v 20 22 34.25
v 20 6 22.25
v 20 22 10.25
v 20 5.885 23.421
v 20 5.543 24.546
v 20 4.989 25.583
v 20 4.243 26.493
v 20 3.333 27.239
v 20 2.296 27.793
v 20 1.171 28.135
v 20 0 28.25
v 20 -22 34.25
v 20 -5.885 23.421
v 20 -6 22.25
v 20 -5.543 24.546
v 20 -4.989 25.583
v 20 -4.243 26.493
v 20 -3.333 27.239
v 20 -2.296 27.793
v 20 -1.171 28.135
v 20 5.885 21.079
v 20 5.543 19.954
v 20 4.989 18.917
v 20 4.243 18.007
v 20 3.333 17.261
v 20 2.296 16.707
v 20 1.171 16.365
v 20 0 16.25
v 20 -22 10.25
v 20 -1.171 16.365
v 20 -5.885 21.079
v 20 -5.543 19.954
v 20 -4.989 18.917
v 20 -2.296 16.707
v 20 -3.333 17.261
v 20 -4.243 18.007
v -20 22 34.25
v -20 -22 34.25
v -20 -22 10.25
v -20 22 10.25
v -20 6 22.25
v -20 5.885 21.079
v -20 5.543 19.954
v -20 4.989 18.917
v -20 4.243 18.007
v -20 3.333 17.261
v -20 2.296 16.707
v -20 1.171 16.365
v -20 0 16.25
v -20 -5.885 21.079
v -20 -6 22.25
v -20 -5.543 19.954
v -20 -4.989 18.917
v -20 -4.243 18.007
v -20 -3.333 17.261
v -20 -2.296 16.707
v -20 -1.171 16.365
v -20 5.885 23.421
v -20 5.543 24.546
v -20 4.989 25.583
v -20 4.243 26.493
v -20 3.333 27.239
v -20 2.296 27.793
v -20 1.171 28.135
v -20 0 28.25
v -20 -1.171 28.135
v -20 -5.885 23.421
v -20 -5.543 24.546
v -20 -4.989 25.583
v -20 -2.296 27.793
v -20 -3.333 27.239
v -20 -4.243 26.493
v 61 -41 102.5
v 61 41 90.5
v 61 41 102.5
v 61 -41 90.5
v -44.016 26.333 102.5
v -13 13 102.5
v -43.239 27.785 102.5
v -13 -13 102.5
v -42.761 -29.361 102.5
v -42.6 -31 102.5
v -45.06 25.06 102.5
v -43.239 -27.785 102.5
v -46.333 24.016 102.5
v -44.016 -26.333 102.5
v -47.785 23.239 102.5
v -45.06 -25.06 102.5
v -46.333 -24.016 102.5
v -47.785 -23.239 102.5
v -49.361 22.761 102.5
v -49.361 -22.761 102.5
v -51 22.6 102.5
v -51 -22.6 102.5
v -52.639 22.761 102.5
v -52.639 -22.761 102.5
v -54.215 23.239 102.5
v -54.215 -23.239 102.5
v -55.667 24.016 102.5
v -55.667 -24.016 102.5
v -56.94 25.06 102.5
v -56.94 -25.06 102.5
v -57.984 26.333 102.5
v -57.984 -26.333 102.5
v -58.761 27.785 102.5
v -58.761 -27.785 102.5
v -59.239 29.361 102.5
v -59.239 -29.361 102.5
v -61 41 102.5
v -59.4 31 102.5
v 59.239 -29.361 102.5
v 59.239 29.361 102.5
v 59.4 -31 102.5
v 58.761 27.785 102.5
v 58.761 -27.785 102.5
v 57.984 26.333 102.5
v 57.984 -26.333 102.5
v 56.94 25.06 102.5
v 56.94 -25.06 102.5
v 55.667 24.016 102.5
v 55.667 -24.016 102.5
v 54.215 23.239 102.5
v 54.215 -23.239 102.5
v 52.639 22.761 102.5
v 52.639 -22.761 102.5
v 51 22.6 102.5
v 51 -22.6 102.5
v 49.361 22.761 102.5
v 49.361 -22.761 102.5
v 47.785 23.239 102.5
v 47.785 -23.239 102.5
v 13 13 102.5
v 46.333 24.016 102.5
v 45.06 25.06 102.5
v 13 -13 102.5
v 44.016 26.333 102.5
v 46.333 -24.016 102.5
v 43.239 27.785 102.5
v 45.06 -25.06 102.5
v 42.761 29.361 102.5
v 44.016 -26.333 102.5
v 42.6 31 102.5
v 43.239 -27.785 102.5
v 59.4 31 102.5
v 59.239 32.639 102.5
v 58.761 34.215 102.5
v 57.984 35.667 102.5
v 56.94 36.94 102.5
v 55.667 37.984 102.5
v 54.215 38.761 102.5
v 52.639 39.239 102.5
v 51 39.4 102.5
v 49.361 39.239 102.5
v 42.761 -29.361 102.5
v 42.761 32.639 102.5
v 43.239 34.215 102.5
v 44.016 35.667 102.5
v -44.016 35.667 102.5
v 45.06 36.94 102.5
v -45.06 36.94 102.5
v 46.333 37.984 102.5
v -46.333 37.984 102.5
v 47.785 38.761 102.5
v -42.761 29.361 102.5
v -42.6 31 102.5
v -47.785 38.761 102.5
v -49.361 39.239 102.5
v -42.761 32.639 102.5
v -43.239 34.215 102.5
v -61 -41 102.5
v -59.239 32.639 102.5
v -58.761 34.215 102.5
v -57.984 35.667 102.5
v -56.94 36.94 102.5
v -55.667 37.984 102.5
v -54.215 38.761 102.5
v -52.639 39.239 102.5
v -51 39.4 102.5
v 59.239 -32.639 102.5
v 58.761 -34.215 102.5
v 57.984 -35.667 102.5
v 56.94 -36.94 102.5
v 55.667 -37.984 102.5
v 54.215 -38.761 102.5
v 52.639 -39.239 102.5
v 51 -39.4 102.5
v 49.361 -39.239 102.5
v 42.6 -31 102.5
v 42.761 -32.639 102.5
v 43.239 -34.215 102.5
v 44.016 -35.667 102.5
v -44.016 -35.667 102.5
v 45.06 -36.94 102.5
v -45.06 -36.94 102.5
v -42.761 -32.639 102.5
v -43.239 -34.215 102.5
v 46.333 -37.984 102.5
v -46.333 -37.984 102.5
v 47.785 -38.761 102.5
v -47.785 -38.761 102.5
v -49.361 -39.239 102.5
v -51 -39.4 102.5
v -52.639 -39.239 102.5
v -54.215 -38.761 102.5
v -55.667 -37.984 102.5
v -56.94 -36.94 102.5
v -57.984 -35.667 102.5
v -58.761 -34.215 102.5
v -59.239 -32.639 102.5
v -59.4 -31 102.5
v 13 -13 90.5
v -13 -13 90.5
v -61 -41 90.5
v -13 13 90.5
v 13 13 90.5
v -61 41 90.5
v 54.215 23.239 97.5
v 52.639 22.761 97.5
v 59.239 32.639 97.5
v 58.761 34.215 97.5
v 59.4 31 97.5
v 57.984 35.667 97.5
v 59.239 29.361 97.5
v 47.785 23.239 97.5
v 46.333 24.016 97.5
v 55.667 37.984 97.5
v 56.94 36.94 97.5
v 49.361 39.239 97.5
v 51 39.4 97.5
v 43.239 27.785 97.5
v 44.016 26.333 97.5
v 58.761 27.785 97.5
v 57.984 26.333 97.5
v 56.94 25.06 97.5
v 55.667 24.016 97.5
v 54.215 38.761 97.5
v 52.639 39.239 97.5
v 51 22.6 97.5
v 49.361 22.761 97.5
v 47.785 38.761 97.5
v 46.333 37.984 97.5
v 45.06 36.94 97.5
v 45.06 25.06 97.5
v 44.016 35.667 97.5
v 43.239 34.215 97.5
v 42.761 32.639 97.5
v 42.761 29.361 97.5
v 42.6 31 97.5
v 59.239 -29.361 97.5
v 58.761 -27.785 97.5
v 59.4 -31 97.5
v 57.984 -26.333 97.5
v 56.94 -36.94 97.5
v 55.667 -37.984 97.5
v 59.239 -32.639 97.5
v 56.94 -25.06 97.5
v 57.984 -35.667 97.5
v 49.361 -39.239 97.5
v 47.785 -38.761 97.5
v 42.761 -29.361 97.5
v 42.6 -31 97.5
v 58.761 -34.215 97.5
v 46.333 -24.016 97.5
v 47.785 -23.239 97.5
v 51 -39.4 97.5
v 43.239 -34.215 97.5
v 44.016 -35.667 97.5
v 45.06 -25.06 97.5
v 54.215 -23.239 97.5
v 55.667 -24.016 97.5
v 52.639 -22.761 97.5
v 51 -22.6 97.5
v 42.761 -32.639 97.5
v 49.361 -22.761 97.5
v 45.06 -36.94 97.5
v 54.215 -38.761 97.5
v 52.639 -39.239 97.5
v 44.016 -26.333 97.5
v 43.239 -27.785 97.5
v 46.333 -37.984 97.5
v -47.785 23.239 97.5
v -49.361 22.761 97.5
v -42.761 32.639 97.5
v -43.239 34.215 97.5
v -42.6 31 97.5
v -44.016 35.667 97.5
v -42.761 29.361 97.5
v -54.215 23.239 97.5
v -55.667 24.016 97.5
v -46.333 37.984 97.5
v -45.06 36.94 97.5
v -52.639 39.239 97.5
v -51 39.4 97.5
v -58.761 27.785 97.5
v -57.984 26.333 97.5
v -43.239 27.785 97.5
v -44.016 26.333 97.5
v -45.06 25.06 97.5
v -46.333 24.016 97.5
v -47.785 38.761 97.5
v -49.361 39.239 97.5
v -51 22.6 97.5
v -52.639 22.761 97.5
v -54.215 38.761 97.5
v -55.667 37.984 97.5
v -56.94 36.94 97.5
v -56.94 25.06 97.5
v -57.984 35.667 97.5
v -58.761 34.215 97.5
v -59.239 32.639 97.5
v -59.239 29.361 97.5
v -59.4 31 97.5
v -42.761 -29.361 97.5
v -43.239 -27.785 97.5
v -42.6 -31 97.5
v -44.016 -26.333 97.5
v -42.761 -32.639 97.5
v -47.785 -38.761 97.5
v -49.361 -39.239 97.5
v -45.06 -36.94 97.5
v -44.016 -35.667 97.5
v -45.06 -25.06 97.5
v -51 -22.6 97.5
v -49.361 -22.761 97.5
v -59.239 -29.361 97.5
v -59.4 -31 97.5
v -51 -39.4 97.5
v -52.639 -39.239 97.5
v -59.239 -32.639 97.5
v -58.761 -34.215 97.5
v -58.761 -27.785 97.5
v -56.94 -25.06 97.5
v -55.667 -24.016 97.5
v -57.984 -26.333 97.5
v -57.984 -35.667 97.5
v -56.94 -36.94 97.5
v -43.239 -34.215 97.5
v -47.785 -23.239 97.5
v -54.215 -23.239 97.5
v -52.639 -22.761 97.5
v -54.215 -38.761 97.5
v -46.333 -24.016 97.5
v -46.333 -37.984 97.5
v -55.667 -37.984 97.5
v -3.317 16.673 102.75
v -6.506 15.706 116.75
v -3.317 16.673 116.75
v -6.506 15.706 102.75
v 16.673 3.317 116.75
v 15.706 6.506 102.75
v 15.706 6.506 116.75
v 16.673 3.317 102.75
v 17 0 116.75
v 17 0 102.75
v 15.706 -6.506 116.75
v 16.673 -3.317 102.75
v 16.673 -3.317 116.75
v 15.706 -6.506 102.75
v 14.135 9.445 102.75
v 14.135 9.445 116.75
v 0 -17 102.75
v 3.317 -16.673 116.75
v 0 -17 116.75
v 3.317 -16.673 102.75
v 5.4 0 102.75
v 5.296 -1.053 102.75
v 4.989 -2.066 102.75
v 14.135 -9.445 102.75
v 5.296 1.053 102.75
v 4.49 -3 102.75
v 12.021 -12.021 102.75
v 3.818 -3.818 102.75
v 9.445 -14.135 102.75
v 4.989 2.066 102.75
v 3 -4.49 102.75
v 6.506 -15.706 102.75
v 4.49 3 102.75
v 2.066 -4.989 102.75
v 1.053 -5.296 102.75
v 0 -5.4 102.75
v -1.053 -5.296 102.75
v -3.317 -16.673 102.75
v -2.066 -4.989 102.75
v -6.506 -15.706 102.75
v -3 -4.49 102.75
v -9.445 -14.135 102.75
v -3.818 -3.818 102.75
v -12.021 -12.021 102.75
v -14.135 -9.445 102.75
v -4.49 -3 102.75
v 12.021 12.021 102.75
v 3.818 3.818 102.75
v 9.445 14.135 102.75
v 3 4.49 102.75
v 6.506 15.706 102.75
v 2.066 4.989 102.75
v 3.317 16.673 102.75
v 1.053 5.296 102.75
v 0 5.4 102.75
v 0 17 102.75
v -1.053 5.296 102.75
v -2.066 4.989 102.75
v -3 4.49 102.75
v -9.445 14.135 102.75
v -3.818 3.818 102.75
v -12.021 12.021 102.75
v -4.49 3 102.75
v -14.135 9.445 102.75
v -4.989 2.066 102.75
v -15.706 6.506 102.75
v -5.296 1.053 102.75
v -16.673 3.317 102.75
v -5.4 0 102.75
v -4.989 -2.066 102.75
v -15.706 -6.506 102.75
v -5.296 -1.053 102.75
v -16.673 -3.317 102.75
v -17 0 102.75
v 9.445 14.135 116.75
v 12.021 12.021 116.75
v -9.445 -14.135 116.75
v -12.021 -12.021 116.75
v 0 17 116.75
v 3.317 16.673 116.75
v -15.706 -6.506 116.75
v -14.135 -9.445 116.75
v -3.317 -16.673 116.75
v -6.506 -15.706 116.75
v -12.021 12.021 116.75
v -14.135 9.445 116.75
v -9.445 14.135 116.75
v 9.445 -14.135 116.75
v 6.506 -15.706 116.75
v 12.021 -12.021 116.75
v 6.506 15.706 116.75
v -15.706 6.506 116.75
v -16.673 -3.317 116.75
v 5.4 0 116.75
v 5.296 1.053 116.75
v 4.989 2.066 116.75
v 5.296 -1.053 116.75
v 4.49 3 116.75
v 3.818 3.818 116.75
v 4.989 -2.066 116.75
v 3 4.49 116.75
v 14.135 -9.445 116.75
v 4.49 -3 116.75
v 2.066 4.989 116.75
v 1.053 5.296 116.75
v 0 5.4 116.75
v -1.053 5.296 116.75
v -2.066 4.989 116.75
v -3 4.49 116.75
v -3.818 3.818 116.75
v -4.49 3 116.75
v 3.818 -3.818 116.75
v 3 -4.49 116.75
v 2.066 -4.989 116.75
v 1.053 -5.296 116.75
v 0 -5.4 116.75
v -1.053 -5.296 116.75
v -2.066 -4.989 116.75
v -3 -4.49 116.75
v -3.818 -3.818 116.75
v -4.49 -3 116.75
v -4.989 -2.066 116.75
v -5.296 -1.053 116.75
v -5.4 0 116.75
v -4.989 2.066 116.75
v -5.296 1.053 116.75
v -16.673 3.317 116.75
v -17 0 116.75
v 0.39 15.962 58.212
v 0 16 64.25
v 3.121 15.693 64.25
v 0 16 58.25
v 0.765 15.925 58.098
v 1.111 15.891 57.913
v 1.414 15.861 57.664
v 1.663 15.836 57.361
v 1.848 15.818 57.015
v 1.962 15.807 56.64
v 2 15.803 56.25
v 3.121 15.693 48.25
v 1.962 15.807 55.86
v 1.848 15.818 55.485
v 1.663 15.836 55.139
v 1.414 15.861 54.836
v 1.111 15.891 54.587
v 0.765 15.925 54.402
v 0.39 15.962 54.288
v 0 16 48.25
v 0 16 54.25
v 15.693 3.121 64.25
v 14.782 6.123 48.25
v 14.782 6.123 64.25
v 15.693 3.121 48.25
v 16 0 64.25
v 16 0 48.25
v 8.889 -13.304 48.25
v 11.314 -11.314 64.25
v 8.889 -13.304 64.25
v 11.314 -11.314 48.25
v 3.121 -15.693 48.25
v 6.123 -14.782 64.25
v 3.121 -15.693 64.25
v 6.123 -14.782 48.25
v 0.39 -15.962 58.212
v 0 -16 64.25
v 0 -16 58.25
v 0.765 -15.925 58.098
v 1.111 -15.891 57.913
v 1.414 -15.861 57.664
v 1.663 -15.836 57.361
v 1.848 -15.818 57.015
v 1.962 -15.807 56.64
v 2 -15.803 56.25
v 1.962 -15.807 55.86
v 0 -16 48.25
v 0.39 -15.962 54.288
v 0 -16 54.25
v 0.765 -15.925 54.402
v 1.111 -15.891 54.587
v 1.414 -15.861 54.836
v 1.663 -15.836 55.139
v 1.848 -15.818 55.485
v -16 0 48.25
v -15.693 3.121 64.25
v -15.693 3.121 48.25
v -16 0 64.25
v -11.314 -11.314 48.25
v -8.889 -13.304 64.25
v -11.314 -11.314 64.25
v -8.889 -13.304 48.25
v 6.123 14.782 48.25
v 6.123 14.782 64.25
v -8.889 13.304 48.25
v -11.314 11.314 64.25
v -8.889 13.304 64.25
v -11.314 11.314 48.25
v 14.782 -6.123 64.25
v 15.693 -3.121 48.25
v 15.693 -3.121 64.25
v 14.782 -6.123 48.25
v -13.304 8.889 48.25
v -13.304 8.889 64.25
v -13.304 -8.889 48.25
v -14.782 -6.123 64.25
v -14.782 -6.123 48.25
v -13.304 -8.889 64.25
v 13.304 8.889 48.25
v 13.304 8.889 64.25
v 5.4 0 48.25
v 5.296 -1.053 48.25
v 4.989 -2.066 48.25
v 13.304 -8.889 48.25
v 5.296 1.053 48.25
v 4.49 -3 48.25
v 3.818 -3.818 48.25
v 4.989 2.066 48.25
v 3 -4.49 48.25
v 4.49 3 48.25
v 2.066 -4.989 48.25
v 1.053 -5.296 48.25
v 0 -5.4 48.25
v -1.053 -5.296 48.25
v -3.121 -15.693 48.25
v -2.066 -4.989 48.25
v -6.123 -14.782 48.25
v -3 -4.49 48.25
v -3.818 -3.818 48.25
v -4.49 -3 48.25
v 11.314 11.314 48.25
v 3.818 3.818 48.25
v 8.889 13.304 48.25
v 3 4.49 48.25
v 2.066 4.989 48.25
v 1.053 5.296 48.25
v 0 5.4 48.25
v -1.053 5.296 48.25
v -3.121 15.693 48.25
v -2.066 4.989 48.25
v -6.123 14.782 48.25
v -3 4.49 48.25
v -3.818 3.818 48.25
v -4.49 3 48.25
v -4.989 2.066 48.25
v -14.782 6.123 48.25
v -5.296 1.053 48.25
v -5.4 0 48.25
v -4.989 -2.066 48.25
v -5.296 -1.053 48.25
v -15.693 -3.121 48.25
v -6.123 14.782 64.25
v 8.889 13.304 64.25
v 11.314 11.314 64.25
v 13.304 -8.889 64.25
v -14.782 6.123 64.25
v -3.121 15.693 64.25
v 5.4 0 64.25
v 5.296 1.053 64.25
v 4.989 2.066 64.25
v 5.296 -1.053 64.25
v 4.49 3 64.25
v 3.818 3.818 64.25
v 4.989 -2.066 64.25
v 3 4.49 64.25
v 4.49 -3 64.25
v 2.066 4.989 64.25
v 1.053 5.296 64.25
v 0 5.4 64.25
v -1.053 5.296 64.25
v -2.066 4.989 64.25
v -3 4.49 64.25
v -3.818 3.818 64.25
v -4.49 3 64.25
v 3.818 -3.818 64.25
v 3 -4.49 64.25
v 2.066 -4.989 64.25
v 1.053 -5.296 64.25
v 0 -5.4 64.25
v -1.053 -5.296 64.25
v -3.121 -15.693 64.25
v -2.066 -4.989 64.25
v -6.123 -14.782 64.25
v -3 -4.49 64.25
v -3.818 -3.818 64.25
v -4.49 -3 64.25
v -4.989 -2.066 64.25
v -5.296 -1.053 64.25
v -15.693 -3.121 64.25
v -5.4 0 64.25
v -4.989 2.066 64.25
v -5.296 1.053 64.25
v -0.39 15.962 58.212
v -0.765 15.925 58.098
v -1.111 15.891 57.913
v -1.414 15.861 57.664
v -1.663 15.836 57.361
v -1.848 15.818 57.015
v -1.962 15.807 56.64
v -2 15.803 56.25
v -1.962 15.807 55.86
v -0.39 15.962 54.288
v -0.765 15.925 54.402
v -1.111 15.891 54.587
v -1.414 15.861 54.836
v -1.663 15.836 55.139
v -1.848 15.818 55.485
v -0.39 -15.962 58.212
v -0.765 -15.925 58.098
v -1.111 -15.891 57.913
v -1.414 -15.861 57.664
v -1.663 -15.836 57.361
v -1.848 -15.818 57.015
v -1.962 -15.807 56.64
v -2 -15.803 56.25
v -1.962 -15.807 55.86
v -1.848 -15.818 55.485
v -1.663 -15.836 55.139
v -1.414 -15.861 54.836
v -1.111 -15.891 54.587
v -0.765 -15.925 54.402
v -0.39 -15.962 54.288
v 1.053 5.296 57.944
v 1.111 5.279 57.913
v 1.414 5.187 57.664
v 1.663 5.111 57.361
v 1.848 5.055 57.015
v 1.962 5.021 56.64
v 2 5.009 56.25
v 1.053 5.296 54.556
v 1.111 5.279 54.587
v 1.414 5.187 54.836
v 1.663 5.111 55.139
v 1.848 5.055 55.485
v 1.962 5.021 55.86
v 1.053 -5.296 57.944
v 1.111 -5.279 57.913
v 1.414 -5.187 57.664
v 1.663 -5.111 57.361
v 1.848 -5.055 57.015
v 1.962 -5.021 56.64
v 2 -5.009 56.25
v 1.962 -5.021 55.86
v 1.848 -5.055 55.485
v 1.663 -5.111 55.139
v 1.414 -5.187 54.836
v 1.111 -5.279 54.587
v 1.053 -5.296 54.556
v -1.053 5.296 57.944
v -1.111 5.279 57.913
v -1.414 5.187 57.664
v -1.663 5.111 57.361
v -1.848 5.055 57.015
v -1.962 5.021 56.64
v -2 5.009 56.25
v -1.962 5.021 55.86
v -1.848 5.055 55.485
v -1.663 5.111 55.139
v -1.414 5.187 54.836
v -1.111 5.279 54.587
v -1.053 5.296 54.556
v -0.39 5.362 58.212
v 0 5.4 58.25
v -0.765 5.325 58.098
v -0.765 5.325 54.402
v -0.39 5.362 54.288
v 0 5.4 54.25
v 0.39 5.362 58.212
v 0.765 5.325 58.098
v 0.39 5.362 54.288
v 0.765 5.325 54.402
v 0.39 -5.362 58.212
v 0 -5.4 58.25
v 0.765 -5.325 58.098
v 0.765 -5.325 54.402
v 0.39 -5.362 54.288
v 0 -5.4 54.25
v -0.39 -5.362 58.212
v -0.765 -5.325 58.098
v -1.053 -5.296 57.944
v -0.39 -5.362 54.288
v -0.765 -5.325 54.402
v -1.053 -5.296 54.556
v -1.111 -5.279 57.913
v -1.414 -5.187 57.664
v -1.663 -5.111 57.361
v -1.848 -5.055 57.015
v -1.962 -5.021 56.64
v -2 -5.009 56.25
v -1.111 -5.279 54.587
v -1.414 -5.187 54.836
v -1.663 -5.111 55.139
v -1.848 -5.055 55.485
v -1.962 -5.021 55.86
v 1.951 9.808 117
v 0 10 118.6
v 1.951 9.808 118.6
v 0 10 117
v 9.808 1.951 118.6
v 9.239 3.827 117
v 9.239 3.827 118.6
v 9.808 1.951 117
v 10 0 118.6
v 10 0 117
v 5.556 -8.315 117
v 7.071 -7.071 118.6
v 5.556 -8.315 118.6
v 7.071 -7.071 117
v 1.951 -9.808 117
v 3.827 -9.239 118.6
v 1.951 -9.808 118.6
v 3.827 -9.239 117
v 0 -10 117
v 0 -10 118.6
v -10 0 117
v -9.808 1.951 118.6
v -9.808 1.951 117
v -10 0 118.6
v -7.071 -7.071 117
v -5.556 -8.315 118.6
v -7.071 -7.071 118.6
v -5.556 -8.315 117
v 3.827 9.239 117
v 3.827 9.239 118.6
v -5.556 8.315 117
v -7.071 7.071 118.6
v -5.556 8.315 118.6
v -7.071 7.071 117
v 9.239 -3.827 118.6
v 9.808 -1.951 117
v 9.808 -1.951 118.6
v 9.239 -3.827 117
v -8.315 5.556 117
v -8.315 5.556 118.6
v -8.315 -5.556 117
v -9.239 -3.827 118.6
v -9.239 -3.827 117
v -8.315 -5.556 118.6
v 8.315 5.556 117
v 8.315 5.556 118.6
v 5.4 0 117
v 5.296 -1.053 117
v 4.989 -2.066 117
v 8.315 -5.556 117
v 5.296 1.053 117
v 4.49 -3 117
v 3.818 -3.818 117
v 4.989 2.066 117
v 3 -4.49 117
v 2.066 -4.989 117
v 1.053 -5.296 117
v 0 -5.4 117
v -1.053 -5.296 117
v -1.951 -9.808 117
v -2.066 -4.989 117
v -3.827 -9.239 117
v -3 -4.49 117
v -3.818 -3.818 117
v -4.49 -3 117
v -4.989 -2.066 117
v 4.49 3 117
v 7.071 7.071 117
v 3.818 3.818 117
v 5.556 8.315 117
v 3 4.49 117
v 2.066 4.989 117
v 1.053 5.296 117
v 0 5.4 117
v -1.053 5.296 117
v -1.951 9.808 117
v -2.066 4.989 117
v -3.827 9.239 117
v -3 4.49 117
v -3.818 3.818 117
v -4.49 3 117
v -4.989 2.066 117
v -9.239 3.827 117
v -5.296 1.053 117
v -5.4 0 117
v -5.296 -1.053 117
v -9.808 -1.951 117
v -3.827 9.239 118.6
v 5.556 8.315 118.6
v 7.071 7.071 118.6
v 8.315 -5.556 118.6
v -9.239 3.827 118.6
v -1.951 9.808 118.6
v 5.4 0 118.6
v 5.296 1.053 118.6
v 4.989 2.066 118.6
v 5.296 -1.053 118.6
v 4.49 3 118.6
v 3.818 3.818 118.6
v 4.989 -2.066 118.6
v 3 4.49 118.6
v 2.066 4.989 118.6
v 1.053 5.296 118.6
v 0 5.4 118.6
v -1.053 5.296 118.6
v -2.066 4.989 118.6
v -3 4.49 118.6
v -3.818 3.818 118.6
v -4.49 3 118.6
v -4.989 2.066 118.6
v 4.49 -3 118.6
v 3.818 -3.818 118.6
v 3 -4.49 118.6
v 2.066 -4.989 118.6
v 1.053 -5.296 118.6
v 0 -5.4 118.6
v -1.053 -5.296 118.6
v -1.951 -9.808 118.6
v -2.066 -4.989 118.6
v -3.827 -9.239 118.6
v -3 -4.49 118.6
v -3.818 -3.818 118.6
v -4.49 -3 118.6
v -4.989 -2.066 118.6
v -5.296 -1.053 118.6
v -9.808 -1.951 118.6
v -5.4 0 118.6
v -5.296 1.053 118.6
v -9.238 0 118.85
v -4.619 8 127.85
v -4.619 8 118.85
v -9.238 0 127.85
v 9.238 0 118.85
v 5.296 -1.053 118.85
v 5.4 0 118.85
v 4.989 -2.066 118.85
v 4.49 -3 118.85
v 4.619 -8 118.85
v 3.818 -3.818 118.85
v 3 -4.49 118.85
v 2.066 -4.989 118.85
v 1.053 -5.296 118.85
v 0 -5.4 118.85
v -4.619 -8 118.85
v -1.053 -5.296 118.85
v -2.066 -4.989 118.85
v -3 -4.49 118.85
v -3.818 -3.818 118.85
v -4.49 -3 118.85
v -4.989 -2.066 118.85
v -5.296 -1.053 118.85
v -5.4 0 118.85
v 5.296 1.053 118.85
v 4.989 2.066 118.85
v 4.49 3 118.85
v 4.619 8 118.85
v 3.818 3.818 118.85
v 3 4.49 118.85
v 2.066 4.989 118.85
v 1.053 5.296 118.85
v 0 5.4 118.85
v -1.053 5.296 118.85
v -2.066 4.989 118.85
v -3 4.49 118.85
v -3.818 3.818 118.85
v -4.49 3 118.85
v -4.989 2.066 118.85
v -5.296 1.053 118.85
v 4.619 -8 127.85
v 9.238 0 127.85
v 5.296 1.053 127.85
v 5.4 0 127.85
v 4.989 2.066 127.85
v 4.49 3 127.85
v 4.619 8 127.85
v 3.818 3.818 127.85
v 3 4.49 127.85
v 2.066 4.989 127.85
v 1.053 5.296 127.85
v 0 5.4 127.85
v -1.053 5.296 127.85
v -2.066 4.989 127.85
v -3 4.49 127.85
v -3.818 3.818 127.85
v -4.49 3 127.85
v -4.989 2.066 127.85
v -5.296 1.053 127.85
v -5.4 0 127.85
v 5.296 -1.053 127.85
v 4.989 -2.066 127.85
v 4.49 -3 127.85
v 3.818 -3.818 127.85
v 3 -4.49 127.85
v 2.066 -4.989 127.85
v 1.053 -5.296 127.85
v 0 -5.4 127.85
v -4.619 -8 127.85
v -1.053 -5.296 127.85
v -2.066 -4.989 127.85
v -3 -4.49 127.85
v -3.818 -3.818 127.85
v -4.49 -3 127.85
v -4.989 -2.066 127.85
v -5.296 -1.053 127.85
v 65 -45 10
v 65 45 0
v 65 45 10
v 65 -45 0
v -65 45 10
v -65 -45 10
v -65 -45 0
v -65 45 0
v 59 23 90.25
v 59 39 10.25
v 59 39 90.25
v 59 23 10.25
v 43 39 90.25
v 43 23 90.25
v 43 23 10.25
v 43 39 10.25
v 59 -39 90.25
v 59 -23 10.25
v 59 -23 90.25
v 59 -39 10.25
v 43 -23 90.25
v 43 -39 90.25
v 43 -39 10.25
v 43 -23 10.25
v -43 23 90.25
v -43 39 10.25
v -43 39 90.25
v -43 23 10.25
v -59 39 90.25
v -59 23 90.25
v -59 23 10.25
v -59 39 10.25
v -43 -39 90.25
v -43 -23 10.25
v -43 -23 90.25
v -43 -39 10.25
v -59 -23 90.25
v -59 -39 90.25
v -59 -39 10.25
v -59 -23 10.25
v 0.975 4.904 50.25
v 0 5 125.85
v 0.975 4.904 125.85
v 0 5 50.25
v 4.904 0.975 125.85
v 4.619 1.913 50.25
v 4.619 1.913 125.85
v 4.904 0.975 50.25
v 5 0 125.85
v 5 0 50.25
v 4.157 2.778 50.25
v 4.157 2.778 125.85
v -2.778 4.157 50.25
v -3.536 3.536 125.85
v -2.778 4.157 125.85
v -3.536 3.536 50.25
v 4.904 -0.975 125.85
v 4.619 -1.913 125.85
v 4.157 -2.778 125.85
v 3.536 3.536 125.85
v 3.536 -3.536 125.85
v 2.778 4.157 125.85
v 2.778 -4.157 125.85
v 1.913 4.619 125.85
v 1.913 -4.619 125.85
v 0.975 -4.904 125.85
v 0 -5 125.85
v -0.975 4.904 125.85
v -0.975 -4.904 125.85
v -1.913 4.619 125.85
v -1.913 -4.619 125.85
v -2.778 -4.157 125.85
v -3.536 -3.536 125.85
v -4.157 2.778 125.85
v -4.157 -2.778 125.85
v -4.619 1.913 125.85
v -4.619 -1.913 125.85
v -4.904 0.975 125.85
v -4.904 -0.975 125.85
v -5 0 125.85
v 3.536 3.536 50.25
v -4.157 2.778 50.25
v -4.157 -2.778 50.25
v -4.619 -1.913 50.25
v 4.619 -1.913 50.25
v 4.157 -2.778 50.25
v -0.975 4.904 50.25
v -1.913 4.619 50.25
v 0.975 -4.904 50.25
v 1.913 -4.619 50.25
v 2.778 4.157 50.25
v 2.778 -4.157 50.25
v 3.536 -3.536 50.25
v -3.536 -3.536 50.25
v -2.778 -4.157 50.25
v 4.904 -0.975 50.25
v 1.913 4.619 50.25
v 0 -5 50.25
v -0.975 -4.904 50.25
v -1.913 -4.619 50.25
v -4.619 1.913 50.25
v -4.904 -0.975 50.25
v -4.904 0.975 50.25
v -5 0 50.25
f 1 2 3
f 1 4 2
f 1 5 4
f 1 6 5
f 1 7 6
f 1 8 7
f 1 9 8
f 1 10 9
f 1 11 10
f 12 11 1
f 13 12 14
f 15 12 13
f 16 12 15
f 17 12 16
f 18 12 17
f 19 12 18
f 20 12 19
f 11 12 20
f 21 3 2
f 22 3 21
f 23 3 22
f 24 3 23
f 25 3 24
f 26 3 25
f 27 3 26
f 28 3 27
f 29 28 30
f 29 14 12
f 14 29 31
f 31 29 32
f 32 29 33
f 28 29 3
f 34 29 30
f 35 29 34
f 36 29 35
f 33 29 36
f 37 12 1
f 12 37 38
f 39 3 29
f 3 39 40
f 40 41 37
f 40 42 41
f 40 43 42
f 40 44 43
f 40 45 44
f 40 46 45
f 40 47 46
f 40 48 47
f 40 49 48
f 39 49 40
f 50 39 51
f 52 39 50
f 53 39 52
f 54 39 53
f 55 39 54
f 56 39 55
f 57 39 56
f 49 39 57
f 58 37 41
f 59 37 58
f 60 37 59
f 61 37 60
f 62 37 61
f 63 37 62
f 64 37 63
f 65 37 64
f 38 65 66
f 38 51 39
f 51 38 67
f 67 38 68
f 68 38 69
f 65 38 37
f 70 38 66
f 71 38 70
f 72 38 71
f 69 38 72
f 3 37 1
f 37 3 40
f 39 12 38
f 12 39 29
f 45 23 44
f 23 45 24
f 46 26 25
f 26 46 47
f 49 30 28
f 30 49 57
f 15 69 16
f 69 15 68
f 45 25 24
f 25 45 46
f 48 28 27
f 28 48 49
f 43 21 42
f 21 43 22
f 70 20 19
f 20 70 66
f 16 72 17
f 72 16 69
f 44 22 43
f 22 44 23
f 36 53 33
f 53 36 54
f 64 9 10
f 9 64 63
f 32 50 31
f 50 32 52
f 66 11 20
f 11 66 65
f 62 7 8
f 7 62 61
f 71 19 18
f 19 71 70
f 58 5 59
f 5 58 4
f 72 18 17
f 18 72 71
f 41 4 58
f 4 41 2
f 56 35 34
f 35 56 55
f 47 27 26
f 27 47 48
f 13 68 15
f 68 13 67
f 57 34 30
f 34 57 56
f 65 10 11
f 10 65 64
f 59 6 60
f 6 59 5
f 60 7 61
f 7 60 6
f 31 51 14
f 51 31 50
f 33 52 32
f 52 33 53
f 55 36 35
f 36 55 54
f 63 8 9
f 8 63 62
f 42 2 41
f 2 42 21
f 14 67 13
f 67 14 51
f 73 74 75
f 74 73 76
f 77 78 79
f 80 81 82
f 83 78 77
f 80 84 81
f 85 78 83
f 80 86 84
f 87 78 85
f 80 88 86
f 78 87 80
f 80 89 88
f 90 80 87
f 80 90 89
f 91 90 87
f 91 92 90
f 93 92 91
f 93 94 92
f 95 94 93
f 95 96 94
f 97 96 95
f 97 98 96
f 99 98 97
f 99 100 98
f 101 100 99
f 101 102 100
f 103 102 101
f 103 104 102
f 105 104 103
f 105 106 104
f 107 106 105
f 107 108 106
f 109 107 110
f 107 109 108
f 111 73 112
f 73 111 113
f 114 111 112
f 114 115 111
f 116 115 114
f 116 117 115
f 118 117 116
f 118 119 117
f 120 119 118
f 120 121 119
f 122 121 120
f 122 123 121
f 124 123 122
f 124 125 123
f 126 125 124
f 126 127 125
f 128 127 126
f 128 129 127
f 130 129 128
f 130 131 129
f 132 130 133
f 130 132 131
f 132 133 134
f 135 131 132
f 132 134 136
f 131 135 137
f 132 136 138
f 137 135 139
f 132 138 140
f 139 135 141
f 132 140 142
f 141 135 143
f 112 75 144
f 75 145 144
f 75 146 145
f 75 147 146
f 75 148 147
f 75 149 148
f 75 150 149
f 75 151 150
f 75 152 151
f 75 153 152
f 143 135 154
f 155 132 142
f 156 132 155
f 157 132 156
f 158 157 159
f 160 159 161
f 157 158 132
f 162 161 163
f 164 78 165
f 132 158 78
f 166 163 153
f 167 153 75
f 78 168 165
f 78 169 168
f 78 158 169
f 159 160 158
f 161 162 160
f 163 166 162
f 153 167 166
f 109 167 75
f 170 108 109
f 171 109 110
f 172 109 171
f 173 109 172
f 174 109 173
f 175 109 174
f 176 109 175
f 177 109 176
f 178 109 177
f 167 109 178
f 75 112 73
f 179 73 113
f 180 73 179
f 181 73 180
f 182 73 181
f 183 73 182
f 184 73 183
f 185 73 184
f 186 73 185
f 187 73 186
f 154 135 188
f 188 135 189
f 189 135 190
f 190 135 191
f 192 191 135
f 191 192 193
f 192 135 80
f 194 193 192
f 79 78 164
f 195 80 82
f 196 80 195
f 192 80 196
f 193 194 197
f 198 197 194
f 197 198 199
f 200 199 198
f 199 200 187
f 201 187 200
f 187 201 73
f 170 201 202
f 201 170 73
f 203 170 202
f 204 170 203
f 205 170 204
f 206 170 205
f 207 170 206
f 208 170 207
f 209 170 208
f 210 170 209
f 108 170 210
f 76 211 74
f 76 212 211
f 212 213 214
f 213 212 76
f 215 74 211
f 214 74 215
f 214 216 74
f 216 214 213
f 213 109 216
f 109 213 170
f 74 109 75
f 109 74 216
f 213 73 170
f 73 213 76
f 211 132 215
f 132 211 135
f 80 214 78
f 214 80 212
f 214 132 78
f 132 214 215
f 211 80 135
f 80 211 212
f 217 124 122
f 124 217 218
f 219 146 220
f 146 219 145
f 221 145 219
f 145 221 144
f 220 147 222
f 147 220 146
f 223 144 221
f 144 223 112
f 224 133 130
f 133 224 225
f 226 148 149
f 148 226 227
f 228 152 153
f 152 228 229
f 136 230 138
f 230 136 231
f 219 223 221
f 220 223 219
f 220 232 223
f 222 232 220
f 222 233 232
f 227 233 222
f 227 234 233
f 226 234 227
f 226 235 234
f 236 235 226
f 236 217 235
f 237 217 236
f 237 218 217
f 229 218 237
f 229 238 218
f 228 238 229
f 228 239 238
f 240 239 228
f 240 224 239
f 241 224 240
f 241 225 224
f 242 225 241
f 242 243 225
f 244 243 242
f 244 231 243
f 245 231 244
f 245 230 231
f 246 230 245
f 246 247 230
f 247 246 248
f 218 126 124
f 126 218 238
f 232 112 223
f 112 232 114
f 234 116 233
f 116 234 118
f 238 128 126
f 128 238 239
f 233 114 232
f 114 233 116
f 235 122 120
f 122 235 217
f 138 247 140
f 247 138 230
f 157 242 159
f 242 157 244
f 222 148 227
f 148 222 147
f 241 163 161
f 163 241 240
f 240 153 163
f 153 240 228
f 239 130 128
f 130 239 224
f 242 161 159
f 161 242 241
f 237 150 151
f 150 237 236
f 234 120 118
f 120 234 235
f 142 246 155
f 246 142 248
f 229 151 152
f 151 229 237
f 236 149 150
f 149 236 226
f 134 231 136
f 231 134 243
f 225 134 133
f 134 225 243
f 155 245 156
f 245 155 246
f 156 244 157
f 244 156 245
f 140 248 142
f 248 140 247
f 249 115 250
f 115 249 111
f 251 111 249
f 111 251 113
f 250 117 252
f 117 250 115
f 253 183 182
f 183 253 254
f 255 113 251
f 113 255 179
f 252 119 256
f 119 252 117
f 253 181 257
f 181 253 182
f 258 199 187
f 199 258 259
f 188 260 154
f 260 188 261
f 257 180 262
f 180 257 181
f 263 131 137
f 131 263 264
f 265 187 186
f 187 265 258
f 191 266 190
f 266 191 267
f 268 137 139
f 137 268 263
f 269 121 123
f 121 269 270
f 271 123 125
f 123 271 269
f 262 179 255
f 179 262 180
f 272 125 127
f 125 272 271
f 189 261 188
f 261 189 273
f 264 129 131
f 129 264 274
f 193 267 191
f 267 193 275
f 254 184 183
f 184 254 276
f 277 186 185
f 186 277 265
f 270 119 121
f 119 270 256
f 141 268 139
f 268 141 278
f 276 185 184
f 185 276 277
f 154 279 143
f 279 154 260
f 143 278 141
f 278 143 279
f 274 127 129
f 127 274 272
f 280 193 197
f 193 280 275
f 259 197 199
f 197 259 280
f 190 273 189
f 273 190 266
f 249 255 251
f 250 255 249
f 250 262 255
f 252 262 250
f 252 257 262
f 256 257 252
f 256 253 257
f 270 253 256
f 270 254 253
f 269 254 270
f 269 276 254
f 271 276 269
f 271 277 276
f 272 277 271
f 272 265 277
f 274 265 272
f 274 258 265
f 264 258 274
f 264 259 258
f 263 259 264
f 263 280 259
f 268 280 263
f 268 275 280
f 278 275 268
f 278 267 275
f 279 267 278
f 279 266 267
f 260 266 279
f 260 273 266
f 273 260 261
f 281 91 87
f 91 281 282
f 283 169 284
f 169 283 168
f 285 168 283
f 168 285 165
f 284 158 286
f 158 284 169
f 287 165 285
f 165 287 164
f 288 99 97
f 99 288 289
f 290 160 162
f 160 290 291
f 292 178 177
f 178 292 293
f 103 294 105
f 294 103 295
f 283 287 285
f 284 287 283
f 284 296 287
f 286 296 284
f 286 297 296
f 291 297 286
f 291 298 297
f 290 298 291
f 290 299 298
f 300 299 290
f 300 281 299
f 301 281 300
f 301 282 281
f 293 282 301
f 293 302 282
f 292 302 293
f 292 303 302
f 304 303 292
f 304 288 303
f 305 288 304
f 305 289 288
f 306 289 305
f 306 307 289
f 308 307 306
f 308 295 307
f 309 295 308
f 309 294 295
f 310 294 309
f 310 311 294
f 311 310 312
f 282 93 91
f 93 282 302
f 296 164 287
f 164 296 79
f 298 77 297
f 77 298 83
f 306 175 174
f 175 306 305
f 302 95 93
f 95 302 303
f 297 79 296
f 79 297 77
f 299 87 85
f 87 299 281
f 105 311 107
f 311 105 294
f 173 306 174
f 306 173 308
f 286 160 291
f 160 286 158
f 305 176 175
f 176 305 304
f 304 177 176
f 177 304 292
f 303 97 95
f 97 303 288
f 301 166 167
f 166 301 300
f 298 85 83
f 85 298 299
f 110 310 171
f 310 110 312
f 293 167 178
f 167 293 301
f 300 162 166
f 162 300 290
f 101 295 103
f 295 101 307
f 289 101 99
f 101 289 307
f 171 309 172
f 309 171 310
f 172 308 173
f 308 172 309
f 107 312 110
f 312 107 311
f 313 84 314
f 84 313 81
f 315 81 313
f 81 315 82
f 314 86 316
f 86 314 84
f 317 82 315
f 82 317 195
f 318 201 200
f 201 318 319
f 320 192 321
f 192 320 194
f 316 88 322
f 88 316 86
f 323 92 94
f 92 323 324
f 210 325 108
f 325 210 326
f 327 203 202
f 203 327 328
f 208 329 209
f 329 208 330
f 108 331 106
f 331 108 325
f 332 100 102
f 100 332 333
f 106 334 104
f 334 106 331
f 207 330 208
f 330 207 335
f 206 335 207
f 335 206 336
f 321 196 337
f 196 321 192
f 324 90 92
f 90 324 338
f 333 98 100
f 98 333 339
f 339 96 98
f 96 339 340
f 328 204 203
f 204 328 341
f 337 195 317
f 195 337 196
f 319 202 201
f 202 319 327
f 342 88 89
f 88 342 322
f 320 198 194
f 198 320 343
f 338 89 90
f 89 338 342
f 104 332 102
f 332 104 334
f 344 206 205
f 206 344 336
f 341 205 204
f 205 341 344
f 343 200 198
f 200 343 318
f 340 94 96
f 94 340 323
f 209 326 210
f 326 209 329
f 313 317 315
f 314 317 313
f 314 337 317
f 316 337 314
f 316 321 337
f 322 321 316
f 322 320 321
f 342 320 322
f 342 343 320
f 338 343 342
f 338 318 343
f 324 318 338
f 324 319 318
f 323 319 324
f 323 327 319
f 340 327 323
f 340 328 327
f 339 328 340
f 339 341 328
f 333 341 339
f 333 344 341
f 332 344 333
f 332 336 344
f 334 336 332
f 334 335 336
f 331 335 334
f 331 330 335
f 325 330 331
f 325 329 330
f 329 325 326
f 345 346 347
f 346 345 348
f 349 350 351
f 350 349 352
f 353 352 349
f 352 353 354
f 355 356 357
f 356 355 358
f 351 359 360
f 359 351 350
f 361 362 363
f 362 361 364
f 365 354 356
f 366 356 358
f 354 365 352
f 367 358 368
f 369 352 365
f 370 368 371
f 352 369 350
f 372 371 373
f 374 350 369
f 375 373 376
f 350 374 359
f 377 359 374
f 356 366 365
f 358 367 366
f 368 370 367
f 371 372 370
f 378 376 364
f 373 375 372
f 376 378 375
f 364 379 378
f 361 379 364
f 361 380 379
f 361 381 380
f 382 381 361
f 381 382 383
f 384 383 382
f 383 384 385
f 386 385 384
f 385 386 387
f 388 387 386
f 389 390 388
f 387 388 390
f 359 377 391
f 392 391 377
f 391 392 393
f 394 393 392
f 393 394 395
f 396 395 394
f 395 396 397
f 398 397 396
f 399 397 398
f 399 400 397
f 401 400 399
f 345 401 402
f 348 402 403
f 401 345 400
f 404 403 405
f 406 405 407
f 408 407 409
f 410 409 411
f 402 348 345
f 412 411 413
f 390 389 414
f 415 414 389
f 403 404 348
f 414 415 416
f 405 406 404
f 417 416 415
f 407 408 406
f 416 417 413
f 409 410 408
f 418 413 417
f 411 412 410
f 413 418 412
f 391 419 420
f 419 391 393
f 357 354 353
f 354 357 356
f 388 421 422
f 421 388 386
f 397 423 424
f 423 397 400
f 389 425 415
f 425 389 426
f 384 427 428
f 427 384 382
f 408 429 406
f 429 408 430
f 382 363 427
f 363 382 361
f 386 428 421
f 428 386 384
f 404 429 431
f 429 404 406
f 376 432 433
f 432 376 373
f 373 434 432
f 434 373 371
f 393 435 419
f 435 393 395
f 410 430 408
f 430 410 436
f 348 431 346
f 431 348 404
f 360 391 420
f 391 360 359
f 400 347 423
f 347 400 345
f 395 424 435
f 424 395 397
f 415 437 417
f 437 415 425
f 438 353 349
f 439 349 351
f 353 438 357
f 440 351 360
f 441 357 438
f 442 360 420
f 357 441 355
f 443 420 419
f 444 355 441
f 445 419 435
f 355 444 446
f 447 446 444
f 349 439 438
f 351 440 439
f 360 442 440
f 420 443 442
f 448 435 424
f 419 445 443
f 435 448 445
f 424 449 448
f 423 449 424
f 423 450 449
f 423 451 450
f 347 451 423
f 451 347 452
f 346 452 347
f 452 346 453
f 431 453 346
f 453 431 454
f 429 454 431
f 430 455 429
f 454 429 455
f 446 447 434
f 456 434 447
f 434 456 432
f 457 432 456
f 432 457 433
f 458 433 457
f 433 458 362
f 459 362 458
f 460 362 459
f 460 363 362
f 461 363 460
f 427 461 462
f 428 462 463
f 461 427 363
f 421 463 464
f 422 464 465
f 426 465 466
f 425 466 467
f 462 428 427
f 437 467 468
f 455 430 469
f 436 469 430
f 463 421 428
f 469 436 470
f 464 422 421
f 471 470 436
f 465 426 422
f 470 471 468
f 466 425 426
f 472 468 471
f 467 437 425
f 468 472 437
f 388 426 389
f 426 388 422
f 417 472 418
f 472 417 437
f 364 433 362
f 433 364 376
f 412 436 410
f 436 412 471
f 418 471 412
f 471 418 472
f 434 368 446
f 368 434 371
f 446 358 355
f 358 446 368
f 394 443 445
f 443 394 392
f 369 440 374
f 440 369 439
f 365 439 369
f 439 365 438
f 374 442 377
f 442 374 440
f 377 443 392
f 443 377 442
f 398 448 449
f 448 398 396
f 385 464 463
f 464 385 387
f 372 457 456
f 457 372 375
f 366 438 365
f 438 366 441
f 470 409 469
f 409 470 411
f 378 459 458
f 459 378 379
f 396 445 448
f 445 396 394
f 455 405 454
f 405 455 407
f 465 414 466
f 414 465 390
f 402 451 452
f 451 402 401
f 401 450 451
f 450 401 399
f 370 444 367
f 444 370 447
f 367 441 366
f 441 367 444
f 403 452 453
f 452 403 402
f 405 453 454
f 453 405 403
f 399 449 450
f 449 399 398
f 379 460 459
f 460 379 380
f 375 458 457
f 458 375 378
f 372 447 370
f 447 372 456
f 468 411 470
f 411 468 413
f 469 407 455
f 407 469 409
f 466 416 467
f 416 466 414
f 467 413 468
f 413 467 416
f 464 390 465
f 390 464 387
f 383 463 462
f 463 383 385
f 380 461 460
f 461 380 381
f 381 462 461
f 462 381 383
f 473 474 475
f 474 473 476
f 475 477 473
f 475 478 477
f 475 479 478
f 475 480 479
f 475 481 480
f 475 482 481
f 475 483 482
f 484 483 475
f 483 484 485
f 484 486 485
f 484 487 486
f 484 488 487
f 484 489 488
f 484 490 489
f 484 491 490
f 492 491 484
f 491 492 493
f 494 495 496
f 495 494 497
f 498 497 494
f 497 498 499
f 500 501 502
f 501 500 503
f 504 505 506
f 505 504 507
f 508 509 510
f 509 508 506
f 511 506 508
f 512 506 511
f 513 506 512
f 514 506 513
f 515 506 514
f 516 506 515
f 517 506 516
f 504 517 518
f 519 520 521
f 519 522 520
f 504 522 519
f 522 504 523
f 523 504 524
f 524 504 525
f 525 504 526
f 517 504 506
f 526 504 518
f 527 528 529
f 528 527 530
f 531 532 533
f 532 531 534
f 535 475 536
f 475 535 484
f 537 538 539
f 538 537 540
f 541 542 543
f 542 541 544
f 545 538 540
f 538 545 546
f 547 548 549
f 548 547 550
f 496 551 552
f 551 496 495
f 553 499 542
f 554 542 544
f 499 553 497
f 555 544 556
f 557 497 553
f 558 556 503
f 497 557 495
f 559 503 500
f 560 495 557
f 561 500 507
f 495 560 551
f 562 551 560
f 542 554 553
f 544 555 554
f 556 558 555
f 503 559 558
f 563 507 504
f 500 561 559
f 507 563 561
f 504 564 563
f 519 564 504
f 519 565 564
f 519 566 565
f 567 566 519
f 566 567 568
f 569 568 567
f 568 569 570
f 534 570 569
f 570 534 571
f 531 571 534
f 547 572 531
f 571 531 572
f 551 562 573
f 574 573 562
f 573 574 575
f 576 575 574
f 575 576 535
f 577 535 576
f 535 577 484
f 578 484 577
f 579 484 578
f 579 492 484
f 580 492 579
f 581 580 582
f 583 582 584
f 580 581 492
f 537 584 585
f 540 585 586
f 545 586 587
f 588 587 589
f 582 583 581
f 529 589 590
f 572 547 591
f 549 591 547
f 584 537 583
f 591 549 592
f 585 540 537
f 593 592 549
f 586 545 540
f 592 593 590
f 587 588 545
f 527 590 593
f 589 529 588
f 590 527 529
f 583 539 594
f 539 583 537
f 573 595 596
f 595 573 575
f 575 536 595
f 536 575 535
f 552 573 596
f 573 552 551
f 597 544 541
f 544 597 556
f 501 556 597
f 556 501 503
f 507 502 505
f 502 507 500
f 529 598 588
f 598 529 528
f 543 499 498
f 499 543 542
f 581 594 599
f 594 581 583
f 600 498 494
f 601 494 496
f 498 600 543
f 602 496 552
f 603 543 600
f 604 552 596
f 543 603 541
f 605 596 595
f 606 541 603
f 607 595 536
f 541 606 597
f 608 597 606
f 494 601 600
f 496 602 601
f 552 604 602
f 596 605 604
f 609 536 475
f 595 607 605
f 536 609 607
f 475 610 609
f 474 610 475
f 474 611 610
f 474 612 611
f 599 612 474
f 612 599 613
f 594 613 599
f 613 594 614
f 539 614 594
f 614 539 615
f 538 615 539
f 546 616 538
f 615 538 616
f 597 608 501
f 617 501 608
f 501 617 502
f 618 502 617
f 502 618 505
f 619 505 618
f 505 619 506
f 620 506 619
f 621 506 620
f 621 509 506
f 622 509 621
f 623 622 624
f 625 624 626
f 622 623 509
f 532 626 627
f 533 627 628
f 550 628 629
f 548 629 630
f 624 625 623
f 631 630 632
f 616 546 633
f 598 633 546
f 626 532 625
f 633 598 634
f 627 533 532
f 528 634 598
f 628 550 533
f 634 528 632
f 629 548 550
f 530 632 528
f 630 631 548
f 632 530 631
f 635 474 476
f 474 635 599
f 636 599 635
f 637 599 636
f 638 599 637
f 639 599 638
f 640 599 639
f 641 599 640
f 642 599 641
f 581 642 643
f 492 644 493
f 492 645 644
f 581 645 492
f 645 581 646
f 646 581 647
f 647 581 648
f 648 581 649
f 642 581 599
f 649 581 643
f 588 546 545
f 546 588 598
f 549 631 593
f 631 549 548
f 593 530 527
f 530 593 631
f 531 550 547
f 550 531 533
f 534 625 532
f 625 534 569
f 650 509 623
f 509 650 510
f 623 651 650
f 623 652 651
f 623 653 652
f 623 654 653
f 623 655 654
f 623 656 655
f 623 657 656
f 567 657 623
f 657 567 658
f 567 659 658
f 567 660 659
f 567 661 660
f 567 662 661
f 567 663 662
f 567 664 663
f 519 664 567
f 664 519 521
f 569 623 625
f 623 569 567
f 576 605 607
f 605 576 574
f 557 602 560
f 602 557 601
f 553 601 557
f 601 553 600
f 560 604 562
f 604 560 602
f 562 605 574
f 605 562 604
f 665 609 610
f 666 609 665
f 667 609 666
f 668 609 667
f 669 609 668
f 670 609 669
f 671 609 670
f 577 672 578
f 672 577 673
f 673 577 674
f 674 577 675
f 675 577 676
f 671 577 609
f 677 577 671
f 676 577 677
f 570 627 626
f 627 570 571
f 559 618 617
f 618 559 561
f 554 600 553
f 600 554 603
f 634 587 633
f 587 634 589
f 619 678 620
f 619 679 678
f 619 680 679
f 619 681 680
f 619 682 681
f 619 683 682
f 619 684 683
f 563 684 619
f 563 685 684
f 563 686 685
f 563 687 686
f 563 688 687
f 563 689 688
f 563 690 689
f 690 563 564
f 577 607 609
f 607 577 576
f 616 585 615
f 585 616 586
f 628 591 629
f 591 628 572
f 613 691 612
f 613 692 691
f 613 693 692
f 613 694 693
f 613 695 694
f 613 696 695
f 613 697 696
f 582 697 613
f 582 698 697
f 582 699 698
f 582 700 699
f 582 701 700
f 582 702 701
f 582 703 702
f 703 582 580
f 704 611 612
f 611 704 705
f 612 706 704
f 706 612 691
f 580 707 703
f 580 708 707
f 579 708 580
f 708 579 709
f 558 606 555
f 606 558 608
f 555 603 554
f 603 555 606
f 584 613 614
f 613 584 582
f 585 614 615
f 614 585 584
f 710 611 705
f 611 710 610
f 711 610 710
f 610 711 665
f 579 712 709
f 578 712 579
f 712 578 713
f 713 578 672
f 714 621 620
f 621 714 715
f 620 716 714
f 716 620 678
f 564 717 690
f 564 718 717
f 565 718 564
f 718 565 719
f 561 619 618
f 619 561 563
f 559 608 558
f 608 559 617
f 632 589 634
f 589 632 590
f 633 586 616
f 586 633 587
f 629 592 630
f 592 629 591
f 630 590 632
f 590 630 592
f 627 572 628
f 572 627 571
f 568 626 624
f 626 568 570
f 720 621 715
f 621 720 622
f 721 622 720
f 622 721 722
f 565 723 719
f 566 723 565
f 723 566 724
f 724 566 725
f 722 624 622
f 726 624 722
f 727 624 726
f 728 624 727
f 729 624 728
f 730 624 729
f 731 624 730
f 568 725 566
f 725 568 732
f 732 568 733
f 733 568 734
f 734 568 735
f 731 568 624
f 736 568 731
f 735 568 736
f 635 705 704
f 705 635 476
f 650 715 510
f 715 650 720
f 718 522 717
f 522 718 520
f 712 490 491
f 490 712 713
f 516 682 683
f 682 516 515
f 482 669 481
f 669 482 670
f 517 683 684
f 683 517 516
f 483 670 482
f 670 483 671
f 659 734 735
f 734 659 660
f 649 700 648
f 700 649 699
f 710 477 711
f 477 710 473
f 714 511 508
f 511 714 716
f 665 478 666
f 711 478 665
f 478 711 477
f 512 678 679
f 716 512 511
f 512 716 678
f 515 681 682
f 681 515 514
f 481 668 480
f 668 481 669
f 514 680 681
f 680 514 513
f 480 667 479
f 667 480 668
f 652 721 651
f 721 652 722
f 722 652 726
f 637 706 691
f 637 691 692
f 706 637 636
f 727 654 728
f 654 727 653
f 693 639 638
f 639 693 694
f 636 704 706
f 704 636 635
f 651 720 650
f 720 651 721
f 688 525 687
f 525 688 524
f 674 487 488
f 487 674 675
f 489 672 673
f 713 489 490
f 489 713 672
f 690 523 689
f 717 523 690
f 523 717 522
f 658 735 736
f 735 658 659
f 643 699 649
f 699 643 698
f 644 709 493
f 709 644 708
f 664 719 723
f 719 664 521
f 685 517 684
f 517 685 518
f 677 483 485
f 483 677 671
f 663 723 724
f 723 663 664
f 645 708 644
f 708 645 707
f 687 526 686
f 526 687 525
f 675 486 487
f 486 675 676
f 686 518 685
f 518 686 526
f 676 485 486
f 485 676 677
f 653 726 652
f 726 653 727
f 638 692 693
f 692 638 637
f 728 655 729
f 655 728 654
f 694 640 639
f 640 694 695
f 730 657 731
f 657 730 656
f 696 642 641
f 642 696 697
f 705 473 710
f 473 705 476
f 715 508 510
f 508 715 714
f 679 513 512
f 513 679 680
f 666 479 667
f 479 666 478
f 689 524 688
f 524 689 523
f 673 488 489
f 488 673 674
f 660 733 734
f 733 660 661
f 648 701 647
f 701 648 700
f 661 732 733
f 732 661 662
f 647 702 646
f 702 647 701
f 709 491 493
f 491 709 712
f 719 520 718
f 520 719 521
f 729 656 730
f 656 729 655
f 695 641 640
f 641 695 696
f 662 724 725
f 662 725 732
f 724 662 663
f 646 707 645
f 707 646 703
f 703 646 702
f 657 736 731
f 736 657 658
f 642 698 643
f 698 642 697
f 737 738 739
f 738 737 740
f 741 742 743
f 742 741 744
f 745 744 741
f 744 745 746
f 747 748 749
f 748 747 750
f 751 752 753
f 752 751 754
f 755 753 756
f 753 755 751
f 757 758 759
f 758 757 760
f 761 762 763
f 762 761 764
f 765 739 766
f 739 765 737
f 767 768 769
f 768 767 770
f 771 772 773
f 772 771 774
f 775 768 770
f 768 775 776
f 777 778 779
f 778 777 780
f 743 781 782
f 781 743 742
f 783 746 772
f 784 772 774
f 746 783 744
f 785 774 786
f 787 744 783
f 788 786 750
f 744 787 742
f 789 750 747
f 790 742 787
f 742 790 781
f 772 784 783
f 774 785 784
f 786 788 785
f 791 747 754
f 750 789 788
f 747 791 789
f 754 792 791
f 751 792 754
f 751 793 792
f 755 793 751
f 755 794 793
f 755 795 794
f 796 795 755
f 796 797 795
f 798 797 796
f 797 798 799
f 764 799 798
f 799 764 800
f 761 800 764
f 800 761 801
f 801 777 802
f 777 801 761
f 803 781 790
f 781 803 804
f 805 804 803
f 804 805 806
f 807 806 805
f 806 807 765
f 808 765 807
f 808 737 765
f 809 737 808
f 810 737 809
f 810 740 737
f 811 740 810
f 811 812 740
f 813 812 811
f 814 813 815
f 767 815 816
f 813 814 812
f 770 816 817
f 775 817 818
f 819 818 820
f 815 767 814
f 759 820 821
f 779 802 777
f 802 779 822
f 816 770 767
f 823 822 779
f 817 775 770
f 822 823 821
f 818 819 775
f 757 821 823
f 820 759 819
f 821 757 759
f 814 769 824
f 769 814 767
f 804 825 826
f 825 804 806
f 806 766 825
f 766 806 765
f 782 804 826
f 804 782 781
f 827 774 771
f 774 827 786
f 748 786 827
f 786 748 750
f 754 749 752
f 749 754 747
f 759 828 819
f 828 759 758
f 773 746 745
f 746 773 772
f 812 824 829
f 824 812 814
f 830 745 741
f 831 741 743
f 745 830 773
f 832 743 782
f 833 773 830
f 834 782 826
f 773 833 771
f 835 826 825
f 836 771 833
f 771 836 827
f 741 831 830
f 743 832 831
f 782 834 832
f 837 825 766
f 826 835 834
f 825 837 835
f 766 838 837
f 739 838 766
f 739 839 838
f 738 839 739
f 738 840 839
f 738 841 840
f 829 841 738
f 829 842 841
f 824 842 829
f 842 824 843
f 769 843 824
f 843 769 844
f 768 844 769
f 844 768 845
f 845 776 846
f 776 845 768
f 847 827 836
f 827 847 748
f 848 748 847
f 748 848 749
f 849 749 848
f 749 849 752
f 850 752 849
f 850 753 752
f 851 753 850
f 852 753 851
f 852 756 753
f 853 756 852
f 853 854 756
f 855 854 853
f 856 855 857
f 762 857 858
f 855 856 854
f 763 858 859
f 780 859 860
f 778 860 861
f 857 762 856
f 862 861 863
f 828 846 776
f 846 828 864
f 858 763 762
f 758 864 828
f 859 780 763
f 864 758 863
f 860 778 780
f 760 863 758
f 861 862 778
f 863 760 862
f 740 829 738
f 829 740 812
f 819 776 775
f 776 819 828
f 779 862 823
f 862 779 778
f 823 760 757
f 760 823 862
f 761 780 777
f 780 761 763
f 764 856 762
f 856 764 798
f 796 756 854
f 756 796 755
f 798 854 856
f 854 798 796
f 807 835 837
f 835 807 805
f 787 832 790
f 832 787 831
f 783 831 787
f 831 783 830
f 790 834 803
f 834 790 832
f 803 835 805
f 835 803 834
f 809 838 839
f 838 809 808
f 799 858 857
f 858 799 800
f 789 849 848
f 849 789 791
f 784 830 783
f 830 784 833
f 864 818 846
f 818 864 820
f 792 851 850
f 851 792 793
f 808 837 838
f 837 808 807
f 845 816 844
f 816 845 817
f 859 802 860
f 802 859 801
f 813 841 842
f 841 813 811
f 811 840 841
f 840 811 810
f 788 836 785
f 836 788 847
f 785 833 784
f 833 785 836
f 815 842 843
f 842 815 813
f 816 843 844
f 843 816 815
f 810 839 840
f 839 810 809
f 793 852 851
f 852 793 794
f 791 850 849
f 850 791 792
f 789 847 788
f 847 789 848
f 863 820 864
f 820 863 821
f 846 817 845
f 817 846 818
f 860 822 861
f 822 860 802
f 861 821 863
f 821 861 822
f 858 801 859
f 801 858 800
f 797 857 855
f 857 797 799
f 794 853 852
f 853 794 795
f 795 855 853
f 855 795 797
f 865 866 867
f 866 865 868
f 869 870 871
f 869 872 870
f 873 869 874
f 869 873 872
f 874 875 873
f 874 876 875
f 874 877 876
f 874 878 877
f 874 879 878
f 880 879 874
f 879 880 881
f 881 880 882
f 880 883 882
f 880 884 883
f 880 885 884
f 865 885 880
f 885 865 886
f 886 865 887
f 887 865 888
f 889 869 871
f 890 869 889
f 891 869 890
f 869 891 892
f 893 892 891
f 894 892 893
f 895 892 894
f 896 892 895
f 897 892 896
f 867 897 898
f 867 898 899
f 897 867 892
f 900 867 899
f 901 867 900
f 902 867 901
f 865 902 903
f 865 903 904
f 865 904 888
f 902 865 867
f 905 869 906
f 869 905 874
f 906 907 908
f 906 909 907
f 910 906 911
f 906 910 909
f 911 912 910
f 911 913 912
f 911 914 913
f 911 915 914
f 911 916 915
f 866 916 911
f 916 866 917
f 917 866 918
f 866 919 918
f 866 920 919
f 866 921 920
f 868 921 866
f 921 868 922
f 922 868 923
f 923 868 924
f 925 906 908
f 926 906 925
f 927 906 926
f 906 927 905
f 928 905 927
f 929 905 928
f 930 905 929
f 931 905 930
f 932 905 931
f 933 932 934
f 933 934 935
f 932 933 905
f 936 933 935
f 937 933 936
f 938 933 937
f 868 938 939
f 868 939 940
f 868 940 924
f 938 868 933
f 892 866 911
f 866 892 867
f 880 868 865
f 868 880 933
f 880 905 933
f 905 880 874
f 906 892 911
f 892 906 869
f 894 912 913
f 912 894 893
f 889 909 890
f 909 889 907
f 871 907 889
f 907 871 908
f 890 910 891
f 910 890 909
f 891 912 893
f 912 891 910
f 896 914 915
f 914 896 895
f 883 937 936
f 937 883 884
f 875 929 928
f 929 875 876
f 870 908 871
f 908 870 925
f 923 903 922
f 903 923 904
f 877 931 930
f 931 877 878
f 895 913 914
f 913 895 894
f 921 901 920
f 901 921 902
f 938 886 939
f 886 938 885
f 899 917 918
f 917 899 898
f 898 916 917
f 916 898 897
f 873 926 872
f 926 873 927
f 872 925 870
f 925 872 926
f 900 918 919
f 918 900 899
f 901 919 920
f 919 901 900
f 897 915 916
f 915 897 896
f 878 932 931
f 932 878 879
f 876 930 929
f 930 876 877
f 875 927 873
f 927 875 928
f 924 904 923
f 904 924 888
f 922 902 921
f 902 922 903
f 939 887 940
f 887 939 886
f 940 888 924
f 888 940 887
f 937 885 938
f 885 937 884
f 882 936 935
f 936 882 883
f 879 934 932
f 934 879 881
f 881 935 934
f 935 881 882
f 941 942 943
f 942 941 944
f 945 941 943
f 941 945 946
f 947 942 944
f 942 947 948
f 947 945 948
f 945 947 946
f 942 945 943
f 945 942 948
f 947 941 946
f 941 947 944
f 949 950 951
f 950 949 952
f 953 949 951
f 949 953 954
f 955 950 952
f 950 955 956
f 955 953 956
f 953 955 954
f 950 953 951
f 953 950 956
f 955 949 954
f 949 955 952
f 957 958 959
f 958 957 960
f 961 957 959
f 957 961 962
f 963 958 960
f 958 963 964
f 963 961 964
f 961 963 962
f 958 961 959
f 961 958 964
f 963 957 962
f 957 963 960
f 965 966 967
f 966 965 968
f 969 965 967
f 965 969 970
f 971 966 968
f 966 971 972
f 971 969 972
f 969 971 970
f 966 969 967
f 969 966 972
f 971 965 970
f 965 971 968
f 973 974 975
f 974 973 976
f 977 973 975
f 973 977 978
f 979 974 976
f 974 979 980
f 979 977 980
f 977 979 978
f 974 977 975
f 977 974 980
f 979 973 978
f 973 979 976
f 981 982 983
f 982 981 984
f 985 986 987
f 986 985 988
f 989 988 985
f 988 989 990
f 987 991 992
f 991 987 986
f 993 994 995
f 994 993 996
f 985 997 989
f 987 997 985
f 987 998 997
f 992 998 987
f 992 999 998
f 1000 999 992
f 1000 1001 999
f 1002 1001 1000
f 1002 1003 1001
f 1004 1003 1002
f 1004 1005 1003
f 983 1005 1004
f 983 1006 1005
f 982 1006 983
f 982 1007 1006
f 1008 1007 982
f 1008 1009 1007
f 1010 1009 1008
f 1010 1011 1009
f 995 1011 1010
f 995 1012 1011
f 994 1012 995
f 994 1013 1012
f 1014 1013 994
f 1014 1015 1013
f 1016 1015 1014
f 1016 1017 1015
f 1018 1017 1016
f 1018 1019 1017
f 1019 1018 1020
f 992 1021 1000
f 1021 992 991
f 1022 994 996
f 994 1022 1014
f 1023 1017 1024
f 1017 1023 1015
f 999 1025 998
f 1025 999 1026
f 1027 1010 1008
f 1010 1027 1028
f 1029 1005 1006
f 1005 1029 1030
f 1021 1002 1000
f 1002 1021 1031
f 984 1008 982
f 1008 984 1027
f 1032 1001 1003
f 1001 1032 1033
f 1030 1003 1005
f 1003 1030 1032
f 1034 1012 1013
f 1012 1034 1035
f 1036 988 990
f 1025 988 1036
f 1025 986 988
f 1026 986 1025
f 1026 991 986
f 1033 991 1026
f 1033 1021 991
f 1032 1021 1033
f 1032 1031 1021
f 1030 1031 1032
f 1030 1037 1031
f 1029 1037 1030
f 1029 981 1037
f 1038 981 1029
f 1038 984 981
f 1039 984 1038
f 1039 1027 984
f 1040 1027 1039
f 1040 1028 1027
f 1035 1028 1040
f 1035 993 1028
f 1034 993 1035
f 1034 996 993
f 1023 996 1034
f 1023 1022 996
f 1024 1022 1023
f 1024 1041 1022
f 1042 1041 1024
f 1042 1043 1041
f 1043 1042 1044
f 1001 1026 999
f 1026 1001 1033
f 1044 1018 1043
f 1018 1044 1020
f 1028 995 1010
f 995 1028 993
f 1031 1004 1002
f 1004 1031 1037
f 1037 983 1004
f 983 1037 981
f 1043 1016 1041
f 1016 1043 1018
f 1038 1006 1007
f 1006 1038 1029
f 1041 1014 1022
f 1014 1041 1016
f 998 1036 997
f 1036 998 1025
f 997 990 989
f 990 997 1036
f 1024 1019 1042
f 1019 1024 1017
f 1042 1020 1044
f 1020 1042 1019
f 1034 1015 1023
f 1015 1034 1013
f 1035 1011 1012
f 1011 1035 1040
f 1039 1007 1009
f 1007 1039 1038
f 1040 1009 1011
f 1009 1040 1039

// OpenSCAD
$fn = 32;

// ------------------------------------------------------------------------
// Arbor press fixture: screw d10, posts 80 mm, gap 14 mm
// Every part is its own module, assembly() places every instance.
// ------------------------------------------------------------------------

// --- part 1 ---
module press_bed() {
  difference() {
    translate([-65, -45, 0]) cube([130, 90, 10]);
  }
}

// --- part 2 ---
module anvil_block() {
  difference() {
    translate([-20, -22, 0]) cube([40, 44, 24]);
    translate([0, 0, 12]) rotate([0, 90, 0]) cylinder(h = 42, d = 12, center = true);
  }
}

// --- part 3 ---
module press_post_a() {
  translate([-8, -8, 0]) cube([16, 16, 80]);
}

// --- part 4 ---
module press_post_b() {
  translate([-8, -8, 0]) cube([16, 16, 80]);
}

// --- part 5 ---
module press_post_c() {
  translate([-8, -8, 0]) cube([16, 16, 80]);
}

// --- part 6 ---
module press_post_d() {
  translate([-8, -8, 0]) cube([16, 16, 80]);
}

// --- part 7 ---
module press_frame() {
  difference() {
    translate([-61, -41, 0]) cube([122, 82, 12]);
    translate([-13, -13, -1]) cube([26, 26, 14]);
    translate([51, 31, 7]) cylinder(h = 6, d = 16.8);
    translate([51, -31, 7]) cylinder(h = 6, d = 16.8);
    translate([-51, 31, 7]) cylinder(h = 6, d = 16.8);
    translate([-51, -31, 7]) cylinder(h = 6, d = 16.8);
  }
}

// --- part 8 ---
module guide_ring() {
  difference() {
      translate([0, 0, 0]) cylinder(h = 14, d = 34);
      translate([0, 0, -1]) cylinder(h = 16, d = 10.8);
    }
}

// --- part 9 ---
module press_screw() {
  translate([0, 0, -37.8]) cylinder(h = 75.6, d = 10);
}

// --- part 10 ---
module press_head() {
  difference() {
    cylinder(h = 16, d = 32);
    translate([0, 0, -1]) cylinder(h = 18, d = 10.8);
    translate([0, 0, 8]) rotate([90, 0, 0]) cylinder(h = 34, d = 4, center = true);
  }
}

// --- part 11 ---
module nut_washer() {
  difference() {
      translate([0, 0, 0]) cylinder(h = 1.6, d = 20);
      translate([0, 0, -1]) cylinder(h = 3.6, d = 10.8);
    }
}

// --- part 12 ---
module press_nut() {
  difference() {
    linear_extrude(height = 9) polygon(points = [[9.238, 0], [4.619, 8], [-4.619, 8], [-9.238, 0], [-4.619, -8], [4.619, -8]]);
    translate([0, 0, -1]) cylinder(h = 11, d = 10.8);
  }
}

// --- assembly ---
module assembly() {
  color([0.80, 0.24, 0.20]) translate([0, 0, 0]) rotate([0, 0, 0]) press_bed();
  color([0.20, 0.45, 0.75]) translate([0, 0, 10.25]) rotate([0, 0, 0]) anvil_block();
  color([0.25, 0.62, 0.32]) translate([51, 31, 10.25]) rotate([0, 0, 0]) press_post_a();
  color([0.92, 0.70, 0.18]) translate([51, -31, 10.25]) rotate([0, 0, 0]) press_post_b();
  color([0.58, 0.35, 0.70]) translate([-51, 31, 10.25]) rotate([0, 0, 0]) press_post_c();
  color([0.16, 0.66, 0.66]) translate([-51, -31, 10.25]) rotate([0, 0, 0]) press_post_d();
  color([0.85, 0.48, 0.18]) translate([0, 0, 90.5]) rotate([0, 0, 0]) press_frame();
  color([0.55, 0.60, 0.65]) translate([0, 0, 102.75]) rotate([0, 0, 0]) guide_ring();
  color([0.75, 0.30, 0.55]) translate([0, 0, 88.05]) rotate([0, 0, 0]) press_screw();
  color([0.42, 0.52, 0.28]) translate([0, 0, 48.25]) rotate([0, 0, 0]) press_head();
  color([0.80, 0.24, 0.20]) translate([0, 0, 117]) rotate([0, 0, 0]) nut_washer();
  color([0.20, 0.45, 0.75]) translate([0, 0, 118.85]) rotate([0, 0, 0]) press_nut();
}

assembly();
